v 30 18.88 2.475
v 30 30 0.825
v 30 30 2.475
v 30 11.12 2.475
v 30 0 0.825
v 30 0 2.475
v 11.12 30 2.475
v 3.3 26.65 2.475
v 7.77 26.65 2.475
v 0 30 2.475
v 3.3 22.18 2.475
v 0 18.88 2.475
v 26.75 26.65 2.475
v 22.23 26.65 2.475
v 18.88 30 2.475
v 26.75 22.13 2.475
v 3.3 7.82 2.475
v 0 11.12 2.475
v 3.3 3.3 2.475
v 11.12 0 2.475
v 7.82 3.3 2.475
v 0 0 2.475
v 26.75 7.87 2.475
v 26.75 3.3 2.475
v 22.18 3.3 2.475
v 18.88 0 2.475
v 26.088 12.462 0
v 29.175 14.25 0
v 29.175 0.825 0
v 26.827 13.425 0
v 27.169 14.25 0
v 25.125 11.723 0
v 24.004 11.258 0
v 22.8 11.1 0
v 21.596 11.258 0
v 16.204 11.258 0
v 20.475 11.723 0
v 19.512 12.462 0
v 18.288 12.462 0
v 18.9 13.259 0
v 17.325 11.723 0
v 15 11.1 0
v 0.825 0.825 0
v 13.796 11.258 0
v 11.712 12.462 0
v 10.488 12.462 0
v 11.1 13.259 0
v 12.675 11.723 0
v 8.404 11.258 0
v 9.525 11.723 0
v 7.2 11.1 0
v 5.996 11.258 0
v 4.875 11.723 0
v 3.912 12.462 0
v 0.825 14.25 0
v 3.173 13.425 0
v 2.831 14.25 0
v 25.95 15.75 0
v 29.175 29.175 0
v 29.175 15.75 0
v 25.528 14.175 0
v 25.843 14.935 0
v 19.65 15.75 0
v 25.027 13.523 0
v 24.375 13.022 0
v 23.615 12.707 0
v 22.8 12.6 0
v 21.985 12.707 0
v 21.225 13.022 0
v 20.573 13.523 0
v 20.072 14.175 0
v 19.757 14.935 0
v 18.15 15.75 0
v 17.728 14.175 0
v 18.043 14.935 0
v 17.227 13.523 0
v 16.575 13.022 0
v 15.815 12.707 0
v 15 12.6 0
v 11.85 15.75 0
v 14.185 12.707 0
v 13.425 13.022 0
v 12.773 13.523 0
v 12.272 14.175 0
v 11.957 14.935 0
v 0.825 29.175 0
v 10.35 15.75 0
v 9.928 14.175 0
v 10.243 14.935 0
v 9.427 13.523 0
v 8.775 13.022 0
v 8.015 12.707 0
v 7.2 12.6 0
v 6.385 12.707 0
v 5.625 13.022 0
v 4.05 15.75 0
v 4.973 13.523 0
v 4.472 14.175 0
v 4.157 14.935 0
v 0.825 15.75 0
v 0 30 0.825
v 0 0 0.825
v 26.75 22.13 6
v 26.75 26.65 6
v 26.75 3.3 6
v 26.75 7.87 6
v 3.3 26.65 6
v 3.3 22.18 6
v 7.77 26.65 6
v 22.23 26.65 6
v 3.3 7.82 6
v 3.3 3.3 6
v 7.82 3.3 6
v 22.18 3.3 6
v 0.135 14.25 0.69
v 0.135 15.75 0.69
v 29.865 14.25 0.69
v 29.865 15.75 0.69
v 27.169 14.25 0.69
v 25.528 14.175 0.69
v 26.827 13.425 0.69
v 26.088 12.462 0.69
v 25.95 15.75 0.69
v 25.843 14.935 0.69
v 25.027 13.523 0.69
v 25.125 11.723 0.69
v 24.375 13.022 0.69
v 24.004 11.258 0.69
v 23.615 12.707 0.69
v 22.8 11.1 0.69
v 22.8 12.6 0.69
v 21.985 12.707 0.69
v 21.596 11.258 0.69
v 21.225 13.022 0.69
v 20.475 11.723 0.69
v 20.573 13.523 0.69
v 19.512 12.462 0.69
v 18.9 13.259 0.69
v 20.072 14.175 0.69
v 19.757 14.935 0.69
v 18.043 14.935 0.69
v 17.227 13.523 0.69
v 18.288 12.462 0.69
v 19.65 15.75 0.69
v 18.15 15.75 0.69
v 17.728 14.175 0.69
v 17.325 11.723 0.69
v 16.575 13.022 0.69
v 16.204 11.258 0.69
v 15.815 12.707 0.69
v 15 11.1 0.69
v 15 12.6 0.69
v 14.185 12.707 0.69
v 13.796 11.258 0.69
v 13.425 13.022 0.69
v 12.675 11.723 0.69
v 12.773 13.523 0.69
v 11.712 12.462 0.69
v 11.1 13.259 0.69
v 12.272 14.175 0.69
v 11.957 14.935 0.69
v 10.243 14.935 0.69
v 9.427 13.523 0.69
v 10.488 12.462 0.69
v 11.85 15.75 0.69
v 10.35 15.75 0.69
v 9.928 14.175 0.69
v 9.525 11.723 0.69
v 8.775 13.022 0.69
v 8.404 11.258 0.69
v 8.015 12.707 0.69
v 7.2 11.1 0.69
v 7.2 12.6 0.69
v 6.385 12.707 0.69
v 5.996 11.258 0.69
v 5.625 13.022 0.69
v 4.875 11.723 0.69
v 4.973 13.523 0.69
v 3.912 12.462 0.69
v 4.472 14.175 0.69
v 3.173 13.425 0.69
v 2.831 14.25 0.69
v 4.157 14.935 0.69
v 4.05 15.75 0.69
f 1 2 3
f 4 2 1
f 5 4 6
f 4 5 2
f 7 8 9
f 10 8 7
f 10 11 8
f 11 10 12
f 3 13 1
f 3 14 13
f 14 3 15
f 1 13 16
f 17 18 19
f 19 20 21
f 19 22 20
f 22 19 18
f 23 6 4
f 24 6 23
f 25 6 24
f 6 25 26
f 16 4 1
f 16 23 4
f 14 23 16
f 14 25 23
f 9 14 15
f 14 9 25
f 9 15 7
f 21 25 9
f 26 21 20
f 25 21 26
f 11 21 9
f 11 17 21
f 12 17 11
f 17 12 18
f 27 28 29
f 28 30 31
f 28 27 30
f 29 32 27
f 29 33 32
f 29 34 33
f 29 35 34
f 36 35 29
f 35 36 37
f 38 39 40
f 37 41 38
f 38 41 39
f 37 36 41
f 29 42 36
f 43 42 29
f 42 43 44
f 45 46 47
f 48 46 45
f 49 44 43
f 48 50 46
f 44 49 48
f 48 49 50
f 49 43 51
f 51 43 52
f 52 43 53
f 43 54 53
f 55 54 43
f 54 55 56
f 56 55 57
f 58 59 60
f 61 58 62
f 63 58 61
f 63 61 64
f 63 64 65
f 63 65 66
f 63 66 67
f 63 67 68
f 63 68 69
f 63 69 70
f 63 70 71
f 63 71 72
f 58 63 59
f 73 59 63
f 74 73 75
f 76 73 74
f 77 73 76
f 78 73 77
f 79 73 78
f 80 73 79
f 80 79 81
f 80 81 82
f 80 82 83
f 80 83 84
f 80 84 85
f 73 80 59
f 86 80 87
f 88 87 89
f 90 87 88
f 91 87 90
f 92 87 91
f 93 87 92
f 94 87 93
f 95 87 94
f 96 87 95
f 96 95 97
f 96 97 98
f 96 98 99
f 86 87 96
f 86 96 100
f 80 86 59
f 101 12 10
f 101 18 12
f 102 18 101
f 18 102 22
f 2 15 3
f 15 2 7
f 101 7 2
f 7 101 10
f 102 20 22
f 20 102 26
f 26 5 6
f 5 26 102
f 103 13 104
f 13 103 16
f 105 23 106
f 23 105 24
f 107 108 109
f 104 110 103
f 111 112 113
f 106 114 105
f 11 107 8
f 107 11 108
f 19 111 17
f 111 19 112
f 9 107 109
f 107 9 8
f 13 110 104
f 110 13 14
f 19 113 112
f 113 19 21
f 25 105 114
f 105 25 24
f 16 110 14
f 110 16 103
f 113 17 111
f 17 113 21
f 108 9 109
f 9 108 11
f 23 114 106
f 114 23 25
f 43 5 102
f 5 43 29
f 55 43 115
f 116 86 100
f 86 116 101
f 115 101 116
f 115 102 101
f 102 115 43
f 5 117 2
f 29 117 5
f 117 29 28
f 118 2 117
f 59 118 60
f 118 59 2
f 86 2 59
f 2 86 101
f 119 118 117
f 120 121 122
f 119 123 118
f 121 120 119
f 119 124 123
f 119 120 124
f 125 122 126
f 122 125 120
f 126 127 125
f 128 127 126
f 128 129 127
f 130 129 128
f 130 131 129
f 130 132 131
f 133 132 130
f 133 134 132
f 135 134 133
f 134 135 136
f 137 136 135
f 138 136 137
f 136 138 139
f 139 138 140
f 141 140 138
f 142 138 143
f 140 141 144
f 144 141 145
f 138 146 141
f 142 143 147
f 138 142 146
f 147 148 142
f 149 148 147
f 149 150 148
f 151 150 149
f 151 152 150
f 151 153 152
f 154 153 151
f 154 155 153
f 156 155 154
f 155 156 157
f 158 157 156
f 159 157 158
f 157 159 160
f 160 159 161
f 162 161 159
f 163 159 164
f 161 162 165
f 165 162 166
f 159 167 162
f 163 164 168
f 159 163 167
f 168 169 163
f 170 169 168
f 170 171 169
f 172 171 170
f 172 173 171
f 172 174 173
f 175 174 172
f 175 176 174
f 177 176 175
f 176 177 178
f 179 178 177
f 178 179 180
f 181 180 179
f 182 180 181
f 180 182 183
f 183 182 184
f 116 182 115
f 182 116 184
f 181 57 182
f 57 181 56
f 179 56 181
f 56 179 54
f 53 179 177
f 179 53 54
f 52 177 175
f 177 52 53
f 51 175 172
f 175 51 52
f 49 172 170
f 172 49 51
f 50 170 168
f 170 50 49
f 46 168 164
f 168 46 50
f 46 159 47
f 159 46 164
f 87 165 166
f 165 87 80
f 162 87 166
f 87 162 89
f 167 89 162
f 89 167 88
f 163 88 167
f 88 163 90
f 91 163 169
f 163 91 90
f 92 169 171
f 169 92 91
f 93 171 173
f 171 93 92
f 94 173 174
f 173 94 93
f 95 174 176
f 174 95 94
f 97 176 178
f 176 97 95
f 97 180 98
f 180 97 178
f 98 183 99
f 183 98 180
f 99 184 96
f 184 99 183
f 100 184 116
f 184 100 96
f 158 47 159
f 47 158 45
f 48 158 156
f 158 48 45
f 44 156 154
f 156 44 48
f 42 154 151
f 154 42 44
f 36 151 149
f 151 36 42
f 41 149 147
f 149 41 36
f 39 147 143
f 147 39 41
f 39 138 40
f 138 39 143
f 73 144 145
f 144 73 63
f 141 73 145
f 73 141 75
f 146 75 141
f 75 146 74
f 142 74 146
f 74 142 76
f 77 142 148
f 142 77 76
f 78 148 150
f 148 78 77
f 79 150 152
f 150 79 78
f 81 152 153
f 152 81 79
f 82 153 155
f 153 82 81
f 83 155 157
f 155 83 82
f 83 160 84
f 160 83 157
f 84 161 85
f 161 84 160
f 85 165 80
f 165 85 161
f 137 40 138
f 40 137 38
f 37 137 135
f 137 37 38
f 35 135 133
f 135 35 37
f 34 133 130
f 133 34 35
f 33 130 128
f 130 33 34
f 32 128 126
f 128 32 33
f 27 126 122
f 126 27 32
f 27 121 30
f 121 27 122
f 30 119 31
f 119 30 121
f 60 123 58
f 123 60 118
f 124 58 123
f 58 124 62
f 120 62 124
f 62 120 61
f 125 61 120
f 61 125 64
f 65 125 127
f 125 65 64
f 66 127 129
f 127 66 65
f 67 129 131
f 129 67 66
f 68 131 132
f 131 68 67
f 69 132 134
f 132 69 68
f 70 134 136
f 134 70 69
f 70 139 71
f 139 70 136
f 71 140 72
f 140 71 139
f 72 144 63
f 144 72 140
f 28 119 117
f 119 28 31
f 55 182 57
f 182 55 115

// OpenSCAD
// file: settings.scad
cube_width=30;
cube_height=16;
cube_thickness=3.3;

cap_width=30;
cap_height=6;
cap_thickness=3.3;

glyph_depth=0.7;
glyph_thickness=1.5;

photo_resitor_hole_r = 2.4;
spring_contact_hole_r = 3.125;
// file: sym_inductor.scad
module sector(radius, angles, fn = 24) {
    r = radius / cos(180 / fn);
    step = -360 / fn;

    points = concat([[0, 0]],
        [for(a = [angles[0] : step : angles[1] - 360]) 
            [r * cos(a), r * sin(a)]
        ],
        [[r * cos(angles[1]), r * sin(angles[1])]]
    );

    difference() {
        circle(radius, $fn = fn);
        polygon(points);
    }
}

module arc(radius, angles, width, fn = 24) {
    difference() {
        sector(radius + width/2, angles, fn);
        sector(radius - width/2, angles, fn);
    }
} 

module arc_3d(radius, angles, width, depth, fn)
{
    linear_extrude(depth) arc(radius, angles, width);
}

module sym_inductor(height, depth, thickness, angle)
{
    n1 = 3;
    //translate([0,-thickness/2,0]) cube([height/6, 2*thickness, depth]);
    r1 = height/(2*n1+4);
    
    rotate([0,0,-angle])translate([-thickness/2, 0, 0]) cube([thickness, 2*r1, depth]);
    
    translate([2*r1*sin(angle), 2*r1*cos(-angle), 0])
    {
        translate([-thickness/2, r1,0]) arc_3d(r1, [-90, 90], thickness, depth, 120);
    
        translate([-thickness/2,3*r1,0]) arc_3d(r1, [-90, 90], thickness, depth, 120);

        translate([-thickness/2,5*r1,0]) arc_3d(r1, [-90, 90], thickness, depth, 120);

        translate([0,6*r1,0]) rotate([0,0,angle]) translate([-thickness/2, 0, 0]) cube([thickness, 2*r1, depth]);
    }

    
    //translate([0,height-1.5*thickness,0]) cube([height/6, 2*thickness, depth]);
}

sym_inductor(30, 0.5, 1, 0);
// file: cap_1x1.scad
include <settings.scad>

module cap_1x1(width, height, thickness, holes_mask)
{
    width1=width-thickness;
    difference()
    {
        union()
        {
            cube([width, width, thickness*3/4]);
            translate([thickness,thickness,0])cube([width-2*(thickness-0.025), width-2*(thickness+0.025), height]);
        }
        union()
        {
            translate([width/2,width/2,0])rotate([0,0,45])translate([-width1/2,-width1/2,thickness*3/4]) cube([width1,width1,height]);
                        //corners
            translate([0,0.25*thickness,0])rotate([45,0,0]) translate([-0.5*width, -width, -0.5*height]) cube([2*width, width, 2*height]);
            translate([0.25*thickness,0,0]) rotate([0,-45,0]) translate([-width, -0.5*width, -0.5*height]) cube([width, 2*width, 2*height]);
            translate([width-0.25*thickness,0,0]) rotate([0,45,0]) translate([0, 0, -0.5*height]) cube([width, 2*width, 2*height]);
            translate([0,width-0.25*thickness,0]) rotate([-45,0,0]) translate([-0.5*width, 0, -0.5*height]) cube([2*width, width, 2*height]);
            
            if (holes_mask >= 8)
            {
                translate([width/2, thickness-1.5, -0.5]) cylinder(r=1.15, h=height*1.5, $fn=80);
            }
            if ((holes_mask%8) >= 4)
            {
                translate([width/2, width-thickness+1.5, -0.5]) cylinder(r=1.15, h=height*1.5, $fn=80);
            }
            if ((holes_mask%4)>= 2)
            {
                translate([thickness-1.5, width/2, -0.5]) cylinder(r=1.15, h=height*1.5, $fn=80);
            }
            if (holes_mask%2 >= 1)
            {
                translate([width-thickness+1.5, width/2, -0.5]) cylinder(r=1.15, h=height*1.5, $fn=80);
            }
        }
    }
}

cap_1x1(cap_width, cap_height, cap_thickness, 9);
//ring(10,1,1);
//arrow(1, 20, 3, 1);
//transistor_npn(30, 1, 1);
// main file
use <cap_1x1.scad>
use <sym_inductor.scad>
include <settings.scad>

module cap_1x1_inductor(width, height, thickness)
{
    difference()
    {
        cap_1x1(width, height, thickness, 0);
        union()
        {
            translate([-width*0.15,width/2,-0.01]) rotate([0,0,-90]) 
            sym_inductor(width*1.3, glyph_depth, glyph_thickness, 0);
            //translate([width/6+glyph_thickness/2,width/2+glyph_thickness/2,-0.01])rotate([0,0,180])cube([width/6,glyph_thickness,glyph_depth]);
            //translate([5*width/6-glyph_thickness/2,(width-glyph_thickness)/2,-0.01])cube([width/5,glyph_thickness,glyph_depth]);
        }
    }
}

cap_1x1_inductor(cap_width, cap_height, cap_thickness);
